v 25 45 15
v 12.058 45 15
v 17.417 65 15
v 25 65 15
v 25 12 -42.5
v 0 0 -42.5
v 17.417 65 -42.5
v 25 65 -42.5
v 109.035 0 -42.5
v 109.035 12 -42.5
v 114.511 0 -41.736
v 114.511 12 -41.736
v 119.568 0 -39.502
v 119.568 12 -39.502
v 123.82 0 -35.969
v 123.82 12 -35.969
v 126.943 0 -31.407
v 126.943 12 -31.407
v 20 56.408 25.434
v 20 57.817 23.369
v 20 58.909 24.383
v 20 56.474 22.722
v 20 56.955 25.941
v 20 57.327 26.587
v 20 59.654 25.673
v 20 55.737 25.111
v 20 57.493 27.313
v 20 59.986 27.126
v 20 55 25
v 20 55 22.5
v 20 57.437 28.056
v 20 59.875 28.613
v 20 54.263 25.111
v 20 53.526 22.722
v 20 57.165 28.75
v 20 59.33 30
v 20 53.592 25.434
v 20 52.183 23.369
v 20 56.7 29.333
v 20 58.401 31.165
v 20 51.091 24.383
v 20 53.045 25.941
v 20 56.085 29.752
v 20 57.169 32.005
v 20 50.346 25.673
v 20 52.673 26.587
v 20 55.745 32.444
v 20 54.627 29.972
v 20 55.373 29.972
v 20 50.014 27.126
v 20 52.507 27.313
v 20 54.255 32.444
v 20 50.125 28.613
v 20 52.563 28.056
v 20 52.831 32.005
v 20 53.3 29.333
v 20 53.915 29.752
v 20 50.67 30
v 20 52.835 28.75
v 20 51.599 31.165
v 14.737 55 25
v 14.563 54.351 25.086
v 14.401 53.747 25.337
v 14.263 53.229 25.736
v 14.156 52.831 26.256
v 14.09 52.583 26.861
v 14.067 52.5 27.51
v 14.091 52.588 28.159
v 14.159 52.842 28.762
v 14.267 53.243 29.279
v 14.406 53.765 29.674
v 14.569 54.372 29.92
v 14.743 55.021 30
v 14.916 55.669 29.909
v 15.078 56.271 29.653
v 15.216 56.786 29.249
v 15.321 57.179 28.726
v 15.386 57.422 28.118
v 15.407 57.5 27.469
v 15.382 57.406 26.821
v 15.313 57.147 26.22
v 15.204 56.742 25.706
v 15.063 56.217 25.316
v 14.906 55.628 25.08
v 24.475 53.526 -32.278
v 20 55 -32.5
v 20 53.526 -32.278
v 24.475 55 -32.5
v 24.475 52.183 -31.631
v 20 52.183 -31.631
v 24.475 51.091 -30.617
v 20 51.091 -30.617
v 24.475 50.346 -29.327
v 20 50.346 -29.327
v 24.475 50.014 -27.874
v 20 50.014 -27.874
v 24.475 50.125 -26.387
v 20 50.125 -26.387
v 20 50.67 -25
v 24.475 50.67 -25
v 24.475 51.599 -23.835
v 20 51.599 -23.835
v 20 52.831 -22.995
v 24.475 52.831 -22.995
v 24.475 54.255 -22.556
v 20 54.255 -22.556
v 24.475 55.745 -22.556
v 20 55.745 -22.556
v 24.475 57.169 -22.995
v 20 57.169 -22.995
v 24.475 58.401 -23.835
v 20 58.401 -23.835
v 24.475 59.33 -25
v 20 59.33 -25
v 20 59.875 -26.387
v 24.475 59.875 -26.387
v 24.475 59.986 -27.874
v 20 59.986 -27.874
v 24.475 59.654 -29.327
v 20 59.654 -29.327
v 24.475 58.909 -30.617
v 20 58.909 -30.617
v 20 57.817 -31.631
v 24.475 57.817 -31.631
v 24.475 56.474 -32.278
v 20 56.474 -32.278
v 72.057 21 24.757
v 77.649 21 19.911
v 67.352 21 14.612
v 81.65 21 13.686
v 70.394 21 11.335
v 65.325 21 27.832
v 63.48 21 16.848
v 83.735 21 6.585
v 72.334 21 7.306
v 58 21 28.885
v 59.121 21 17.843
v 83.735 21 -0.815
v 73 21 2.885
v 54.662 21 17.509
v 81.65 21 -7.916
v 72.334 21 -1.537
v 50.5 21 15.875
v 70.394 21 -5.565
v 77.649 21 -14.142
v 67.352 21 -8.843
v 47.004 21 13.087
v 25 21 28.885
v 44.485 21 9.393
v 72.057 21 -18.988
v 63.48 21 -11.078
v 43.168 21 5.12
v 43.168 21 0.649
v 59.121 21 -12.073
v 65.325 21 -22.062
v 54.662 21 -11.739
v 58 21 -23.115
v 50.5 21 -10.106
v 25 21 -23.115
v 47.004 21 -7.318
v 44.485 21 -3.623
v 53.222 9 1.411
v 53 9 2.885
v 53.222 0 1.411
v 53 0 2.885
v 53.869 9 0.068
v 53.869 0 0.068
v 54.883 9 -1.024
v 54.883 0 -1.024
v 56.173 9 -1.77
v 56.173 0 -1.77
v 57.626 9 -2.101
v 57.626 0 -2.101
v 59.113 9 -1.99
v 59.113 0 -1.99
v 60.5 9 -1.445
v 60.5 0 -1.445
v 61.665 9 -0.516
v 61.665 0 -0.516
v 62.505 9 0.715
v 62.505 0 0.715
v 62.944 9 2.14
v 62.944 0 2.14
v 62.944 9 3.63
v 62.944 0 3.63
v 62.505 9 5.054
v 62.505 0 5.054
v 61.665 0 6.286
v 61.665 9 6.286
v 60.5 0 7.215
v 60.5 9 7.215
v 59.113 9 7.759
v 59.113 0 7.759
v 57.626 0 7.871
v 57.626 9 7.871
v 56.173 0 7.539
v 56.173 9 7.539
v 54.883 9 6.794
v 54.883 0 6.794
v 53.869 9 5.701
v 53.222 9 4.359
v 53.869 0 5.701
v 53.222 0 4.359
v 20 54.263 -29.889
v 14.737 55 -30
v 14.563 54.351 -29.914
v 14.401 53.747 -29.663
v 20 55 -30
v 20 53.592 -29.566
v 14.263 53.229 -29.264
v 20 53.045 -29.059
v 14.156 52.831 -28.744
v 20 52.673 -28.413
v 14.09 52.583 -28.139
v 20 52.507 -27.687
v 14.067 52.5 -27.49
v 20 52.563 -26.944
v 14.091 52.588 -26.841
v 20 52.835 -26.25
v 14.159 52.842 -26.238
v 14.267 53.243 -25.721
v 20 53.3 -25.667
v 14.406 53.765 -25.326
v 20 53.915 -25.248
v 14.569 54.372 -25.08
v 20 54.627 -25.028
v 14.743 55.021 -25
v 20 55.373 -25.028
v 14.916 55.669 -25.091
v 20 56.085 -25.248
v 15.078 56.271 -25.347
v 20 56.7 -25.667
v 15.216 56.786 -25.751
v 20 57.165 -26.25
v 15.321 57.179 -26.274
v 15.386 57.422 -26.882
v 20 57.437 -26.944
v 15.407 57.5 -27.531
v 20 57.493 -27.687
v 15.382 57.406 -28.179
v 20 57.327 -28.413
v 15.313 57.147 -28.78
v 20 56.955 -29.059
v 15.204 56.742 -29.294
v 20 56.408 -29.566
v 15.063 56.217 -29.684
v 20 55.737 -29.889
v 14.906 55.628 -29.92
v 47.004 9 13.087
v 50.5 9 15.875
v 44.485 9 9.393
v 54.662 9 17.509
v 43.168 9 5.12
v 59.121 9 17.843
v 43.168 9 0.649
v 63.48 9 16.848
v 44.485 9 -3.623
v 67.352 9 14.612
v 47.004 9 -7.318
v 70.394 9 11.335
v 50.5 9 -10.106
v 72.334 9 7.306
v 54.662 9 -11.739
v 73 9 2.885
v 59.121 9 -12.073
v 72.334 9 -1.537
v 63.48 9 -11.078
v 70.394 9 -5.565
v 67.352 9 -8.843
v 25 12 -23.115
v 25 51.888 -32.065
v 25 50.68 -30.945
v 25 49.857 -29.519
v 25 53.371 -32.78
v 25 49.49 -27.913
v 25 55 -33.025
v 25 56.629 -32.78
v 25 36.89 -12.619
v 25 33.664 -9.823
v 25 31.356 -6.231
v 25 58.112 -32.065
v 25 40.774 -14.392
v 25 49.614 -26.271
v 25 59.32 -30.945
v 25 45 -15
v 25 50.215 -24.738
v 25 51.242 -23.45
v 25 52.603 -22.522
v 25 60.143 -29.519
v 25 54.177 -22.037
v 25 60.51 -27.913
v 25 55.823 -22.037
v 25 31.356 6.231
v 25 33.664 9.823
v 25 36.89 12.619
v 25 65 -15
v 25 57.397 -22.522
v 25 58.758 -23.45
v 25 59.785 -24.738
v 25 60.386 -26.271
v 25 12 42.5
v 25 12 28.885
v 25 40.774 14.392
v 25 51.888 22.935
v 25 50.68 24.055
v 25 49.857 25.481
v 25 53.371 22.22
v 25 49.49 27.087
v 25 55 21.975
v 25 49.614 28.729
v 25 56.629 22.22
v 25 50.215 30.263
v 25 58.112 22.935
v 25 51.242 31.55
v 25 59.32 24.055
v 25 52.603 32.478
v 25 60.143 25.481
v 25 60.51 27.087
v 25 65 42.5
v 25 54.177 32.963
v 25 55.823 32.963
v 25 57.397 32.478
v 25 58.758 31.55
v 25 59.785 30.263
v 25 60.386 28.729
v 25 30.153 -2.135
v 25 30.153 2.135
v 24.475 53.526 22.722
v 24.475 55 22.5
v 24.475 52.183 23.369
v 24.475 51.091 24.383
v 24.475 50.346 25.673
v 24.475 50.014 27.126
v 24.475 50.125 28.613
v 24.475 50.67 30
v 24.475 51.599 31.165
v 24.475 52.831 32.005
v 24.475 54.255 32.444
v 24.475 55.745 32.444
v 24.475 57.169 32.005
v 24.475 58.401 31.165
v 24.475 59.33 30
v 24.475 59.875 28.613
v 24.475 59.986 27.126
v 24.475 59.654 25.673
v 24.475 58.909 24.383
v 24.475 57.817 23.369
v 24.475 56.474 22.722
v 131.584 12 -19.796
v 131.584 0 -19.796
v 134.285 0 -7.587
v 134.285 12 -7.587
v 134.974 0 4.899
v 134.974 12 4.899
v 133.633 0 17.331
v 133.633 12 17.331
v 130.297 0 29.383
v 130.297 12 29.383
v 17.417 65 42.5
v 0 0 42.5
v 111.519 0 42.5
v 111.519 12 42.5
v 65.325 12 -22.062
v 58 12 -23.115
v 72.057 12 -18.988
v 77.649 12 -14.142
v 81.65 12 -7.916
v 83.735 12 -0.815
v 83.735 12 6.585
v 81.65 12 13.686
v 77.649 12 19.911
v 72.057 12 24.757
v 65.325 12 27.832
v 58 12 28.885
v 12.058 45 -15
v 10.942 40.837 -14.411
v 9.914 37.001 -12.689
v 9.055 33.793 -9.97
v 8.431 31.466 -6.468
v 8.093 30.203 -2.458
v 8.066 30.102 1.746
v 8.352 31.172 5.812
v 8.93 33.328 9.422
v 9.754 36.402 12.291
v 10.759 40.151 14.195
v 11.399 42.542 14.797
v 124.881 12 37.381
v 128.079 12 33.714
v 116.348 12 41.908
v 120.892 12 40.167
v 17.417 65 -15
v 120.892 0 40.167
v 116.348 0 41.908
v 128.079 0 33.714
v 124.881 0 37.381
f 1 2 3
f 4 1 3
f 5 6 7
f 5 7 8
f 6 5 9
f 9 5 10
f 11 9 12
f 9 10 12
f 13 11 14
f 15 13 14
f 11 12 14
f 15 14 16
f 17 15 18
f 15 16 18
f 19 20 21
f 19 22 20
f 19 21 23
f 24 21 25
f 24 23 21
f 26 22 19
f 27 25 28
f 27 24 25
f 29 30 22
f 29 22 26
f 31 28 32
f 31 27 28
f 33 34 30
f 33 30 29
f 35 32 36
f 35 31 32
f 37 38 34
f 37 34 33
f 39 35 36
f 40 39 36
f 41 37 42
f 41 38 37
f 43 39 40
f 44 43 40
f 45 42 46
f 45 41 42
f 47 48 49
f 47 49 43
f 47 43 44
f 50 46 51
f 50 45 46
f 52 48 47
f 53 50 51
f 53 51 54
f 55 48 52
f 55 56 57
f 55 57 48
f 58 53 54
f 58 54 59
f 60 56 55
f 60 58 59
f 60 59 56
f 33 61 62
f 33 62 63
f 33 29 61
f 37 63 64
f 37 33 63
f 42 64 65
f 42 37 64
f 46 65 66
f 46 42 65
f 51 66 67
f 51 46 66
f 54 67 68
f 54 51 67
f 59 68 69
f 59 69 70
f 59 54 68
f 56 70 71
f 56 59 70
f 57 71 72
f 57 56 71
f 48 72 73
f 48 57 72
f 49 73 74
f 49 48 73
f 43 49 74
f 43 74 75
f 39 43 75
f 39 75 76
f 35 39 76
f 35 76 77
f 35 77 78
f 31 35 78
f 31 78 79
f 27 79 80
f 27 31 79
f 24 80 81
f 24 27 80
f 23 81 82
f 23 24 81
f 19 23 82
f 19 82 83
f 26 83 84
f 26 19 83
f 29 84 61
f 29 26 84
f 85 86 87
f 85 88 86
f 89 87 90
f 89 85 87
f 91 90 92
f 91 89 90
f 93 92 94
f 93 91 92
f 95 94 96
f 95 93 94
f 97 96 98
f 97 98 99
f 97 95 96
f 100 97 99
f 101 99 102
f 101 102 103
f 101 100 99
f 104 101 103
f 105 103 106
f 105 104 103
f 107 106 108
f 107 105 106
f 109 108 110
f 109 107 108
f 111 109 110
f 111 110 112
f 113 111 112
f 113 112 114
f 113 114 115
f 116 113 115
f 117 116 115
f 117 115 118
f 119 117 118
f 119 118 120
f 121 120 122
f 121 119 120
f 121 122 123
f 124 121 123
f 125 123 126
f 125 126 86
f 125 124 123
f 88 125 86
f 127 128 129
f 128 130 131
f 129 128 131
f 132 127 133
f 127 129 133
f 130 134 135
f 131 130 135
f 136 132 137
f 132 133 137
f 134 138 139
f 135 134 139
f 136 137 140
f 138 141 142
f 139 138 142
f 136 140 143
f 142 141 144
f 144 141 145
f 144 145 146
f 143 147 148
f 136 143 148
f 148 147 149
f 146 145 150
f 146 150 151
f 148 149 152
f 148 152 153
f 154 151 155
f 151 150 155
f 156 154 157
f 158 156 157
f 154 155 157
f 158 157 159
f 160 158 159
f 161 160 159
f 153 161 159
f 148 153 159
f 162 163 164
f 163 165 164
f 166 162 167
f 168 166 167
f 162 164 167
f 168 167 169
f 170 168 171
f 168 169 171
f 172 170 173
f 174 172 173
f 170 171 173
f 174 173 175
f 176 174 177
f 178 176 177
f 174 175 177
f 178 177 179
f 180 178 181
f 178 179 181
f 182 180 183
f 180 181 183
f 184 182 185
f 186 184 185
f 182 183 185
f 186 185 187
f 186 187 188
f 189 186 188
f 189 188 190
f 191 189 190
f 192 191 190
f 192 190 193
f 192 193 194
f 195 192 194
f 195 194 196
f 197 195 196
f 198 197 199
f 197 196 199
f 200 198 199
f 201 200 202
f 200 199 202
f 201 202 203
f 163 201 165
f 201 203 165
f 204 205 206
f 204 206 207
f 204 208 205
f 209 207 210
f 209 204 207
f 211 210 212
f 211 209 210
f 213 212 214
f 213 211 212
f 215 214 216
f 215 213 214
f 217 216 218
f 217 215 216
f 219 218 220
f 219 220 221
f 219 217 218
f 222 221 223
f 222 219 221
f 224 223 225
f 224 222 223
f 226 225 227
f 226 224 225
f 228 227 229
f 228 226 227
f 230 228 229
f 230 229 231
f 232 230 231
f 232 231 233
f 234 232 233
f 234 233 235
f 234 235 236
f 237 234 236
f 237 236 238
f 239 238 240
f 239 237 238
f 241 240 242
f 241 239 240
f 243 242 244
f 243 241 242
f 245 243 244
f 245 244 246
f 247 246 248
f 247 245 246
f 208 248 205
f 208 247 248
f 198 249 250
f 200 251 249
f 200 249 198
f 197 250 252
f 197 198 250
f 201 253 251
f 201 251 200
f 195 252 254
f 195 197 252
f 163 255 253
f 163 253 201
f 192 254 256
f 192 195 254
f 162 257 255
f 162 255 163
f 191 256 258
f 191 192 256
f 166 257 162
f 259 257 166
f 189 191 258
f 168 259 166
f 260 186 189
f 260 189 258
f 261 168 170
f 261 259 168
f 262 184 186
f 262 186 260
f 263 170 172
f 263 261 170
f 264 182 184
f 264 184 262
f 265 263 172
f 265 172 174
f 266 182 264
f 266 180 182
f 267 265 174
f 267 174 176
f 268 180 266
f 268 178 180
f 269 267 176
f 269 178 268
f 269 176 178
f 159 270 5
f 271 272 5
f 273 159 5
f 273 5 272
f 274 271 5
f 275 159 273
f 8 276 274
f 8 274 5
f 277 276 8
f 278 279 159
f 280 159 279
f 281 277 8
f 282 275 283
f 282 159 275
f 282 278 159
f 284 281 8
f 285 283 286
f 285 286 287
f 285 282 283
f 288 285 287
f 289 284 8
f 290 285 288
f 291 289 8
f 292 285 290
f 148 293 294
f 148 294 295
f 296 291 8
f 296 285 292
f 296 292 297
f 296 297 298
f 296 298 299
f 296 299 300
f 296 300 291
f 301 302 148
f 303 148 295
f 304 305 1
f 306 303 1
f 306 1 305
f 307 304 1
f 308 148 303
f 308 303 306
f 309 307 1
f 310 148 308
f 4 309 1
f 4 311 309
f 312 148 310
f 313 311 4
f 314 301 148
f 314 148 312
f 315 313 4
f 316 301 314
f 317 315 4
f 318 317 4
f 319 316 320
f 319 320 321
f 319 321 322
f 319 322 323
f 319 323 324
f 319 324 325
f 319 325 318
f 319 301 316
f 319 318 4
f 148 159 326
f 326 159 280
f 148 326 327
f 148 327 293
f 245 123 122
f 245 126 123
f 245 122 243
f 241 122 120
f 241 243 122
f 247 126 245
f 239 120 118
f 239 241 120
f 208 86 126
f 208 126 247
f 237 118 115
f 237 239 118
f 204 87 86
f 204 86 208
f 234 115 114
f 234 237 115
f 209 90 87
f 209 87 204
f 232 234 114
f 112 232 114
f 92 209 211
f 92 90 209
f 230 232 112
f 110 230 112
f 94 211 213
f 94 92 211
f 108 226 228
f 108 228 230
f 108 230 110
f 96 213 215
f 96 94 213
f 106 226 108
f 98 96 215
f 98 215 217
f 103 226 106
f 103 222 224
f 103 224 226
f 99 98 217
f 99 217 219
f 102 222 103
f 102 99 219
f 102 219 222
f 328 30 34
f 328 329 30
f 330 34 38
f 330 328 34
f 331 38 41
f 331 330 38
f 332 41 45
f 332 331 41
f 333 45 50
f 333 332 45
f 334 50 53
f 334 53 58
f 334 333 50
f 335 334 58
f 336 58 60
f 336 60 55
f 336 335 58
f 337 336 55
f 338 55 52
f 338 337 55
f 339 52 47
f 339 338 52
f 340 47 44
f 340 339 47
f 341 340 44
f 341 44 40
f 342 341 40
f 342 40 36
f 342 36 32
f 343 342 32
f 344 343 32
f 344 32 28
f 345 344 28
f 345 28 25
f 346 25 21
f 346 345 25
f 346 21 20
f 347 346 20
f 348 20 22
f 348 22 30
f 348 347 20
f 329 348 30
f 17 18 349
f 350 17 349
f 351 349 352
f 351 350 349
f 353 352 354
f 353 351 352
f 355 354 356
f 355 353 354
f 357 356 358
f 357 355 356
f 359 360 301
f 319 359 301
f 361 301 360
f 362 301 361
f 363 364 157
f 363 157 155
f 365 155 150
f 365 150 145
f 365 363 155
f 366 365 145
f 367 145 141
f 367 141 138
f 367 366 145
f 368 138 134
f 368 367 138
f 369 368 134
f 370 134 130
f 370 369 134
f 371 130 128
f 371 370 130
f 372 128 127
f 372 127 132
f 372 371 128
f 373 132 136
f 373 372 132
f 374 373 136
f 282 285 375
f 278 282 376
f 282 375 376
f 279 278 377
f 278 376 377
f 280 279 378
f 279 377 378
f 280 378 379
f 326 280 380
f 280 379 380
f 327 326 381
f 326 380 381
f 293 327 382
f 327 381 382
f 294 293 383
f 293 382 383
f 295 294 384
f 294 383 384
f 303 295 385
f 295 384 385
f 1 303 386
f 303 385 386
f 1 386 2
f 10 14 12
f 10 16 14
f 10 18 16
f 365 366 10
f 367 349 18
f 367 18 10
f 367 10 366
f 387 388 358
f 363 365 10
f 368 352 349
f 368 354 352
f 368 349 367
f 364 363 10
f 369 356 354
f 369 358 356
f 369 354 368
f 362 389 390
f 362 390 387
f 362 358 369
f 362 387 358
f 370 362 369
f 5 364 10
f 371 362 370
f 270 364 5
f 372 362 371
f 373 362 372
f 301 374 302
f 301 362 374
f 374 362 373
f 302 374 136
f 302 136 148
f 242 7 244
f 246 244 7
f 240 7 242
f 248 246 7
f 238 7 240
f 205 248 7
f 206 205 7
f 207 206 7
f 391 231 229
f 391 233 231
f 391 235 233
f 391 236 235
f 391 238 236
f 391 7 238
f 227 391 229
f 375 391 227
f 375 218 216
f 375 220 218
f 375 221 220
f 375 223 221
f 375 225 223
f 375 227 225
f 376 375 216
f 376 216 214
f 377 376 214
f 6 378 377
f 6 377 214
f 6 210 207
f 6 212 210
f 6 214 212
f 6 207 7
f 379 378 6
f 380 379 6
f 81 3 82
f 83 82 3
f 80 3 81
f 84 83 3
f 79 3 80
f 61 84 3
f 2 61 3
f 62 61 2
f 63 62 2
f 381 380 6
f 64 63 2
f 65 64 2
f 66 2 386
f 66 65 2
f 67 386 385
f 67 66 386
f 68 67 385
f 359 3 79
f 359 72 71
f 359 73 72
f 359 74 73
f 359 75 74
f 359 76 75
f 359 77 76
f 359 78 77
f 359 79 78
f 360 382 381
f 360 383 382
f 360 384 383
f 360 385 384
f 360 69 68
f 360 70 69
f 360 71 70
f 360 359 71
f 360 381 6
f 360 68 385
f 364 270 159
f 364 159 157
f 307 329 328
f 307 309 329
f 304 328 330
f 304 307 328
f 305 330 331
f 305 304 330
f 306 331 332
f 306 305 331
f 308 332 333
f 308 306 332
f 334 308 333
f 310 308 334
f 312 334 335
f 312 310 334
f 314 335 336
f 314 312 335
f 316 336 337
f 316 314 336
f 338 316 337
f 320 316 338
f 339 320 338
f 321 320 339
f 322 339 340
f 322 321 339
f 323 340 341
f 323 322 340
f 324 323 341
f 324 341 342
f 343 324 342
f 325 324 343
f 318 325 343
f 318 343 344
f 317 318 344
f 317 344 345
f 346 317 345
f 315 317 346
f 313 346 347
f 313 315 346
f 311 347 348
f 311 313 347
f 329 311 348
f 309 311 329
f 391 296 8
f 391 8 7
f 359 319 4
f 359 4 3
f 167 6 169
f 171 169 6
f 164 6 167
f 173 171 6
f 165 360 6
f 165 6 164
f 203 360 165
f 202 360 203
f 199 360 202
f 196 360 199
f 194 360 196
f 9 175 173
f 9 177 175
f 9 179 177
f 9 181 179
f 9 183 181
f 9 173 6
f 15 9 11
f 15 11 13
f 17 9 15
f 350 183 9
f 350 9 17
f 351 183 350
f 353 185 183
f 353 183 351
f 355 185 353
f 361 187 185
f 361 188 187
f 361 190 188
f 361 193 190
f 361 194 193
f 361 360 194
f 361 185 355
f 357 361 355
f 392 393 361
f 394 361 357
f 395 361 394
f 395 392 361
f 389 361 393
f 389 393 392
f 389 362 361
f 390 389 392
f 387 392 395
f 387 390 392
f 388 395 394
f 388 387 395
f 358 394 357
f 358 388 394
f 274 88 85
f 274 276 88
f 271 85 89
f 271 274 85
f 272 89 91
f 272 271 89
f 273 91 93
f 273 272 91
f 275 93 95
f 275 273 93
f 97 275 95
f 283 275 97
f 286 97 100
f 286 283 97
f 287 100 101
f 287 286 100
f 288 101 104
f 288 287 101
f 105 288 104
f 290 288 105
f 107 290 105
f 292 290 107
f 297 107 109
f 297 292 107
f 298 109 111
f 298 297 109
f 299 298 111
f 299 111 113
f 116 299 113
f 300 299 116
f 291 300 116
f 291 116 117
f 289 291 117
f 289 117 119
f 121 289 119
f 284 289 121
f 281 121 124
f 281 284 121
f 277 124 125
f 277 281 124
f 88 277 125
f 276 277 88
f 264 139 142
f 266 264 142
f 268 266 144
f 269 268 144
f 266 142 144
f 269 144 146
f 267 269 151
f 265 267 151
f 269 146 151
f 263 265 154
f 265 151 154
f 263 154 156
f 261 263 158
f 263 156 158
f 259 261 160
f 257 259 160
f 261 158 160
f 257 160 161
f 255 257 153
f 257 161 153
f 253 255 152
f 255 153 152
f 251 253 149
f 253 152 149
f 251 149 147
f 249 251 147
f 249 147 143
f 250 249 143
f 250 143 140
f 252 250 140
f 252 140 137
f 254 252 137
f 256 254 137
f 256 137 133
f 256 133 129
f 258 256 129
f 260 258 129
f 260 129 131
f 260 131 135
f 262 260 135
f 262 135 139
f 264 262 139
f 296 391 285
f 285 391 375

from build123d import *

# Parameters (mm, degrees)
P_IDAT_VYSUNUT_M1_DEPTH                           = 42.5
ODEBRAT_VYSUNUT_M1_DEPTH                          = 152.129911004
ODEBRAT_VYSUNUT_M1_DEPTH_BACK                     = 152.129911004
P_IDAT_VYSUNUT_M2_DEPTH                           = 9
ODEBRAT_VYSUNUT_M2_DEPTH                          = 135.652330095
ODEBRAT_VYSUNUT_M2_DEPTH_BACK                     = 135.652330095
V_LCOV_ZAHLOUBEN_PRO_M5_ROUBY_S_V_2_COUNT         = 2
V_LCOV_ZAHLOUBEN_PRO_M5_ROUBY_S_V_2_PITCH         = 27.950849719
V_LCOV_ZAHLOUBEN_PRO_M5_ROUBY_S_V_3_COUNT         = 2
V_LCOV_ZAHLOUBEN_PRO_M5_ROUBY_S_V_3_PITCH         = 27.950849719
V_LCOV_ZAHLOUBEN_PRO_M10_ROUBY_S_V_LC_D           = 10
V_LCOV_ZAHLOUBEN_PRO_M10_ROUBY_S_V_LC_CBORE_D     = 30
V_LCOV_ZAHLOUBEN_PRO_M10_ROUBY_S_V_LC_CBORE_DEPTH = 12
ZAOBLIT1_R                                        = 20


with BuildPart() as part:
    # Skica1 → Přidat vysunutím1 (new, symmetric)
    with BuildSketch(Plane.XY):
        Polygon((0, 0), (135, 0), (135, 12), (25, 12), (25, 65), (17.416697508, 65), align=None)
    extrude(amount=P_IDAT_VYSUNUT_M1_DEPTH, both=True)

    # Skica2 → Odebrat vysunutím1 (cut, two sides: drawn at the far end of the back side and taken through both)
    with BuildSketch(Plane(origin=(0, 12, 0), x_dir=(1, 0, 0), z_dir=(0, 1, 0)).offset(-ODEBRAT_VYSUNUT_M1_DEPTH_BACK)):
        with BuildLine():
            Line((-62.938175678, 293.50791206), (120.203054159, 42.5))
            ThreePointArc((120.203054159, 42.5), (134.922176639, 0.576231991), (124.027539054, -42.5))
            Line((124.027539054, -42.5), (-35.831632193, -308.940851505))
            Line((-35.831632193, -308.940851505), (584.976307558, -281.00825635))
            Line((584.976307558, -281.00825635), (557.869764074, 321.440507215))
            Line((557.869764074, 321.440507215), (-62.938175678, 293.50791206))
        make_face()
    extrude(amount=ODEBRAT_VYSUNUT_M1_DEPTH + ODEBRAT_VYSUNUT_M1_DEPTH_BACK, mode=Mode.SUBTRACT)

    # Skica3 → Přidat vysunutím2 (add)
    with BuildSketch(Plane(origin=(0, 12, 0), x_dir=(1, 0, 0), z_dir=(0, 1, 0))):
        with BuildLine():
            Line((25, 23.115200195), (58, 23.115200195))
            ThreePointArc((58, 23.115200195), (84, -2.884799805), (58, -28.884799805))
            Line((58, -28.884799805), (25, -28.884799805))
            Line((25, -28.884799805), (25, 23.115200195))
        make_face()
    extrude(amount=P_IDAT_VYSUNUT_M2_DEPTH)

    # Skica4 → Odebrat vysunutím2 (cut, two sides: drawn at the far end of the back side and taken through both)
    with BuildSketch(Plane(origin=(25, 0, 0), x_dir=(0, 0, -1), z_dir=(1, 0, 0)).offset(-ODEBRAT_VYSUNUT_M2_DEPTH_BACK)):
        with BuildLine():
            Line((15, 65), (15, 45))
            ThreePointArc((15, 45), (0, 30), (-15, 45))
            Line((-15, 45), (-15, 65))
            Line((-15, 65), (15, 65))
        make_face()
    extrude(amount=ODEBRAT_VYSUNUT_M2_DEPTH + ODEBRAT_VYSUNUT_M2_DEPTH_BACK, mode=Mode.SUBTRACT)

    # Skica9 → Válcové zahloubení pro M5 šrouby s válcovou hlavou zaoblenou1 (revolve, cut)
    with BuildSketch(Plane(origin=(25, 60, 0), x_dir=(0, 0, -1), z_dir=(0, 1, 0))):
        Polygon((0, 0), (0, 25), (2.5, 25), (2.5, 5), (5, 5), (5, 0.525), (5.525, 0), align=None)
    v_lcov_zahlouben_pro_m5_rouby_s_v_lco = revolve(axis=Axis((31.35, 60, 0), (-1, 0, 0)), mode=Mode.SUBTRACT)

    # V_lcov_ zahlouben_ pro M5 _rouby s v 2: Válcové zahloubení pro M5 šrouby s válcovou hlavou zaoblenou1 ×2
    with Locations(*[Vector(0, -0.1788854381999832, -0.9838699100999074) * (i * V_LCOV_ZAHLOUBEN_PRO_M5_ROUBY_S_V_2_PITCH) for i in range(1, V_LCOV_ZAHLOUBEN_PRO_M5_ROUBY_S_V_2_COUNT)]):
        add(v_lcov_zahlouben_pro_m5_rouby_s_v_lco, mode=Mode.SUBTRACT)

    # V_lcov_ zahlouben_ pro M5 _rouby s v 3: Válcové zahloubení pro M5 šrouby s válcovou hlavou zaoblenou1 ×2
    with Locations(*[Vector(0, -0.1788854381999834, 0.9838699100999074) * (i * V_LCOV_ZAHLOUBEN_PRO_M5_ROUBY_S_V_3_PITCH) for i in range(1, V_LCOV_ZAHLOUBEN_PRO_M5_ROUBY_S_V_3_COUNT)]):
        add(v_lcov_zahlouben_pro_m5_rouby_s_v_lco, mode=Mode.SUBTRACT)

    # Válcové zahloubení pro M10 šrouby s válcovou hlavou zaoblenou3 (through all)
    with Locations(Plane(origin=(0, 21, 0), x_dir=(1, 0, 0), z_dir=(0, 1, 0))):
        with Locations((58, -2.884799805)):
            CounterBoreHole(V_LCOV_ZAHLOUBEN_PRO_M10_ROUBY_S_V_LC_D / 2, V_LCOV_ZAHLOUBEN_PRO_M10_ROUBY_S_V_LC_CBORE_D / 2, V_LCOV_ZAHLOUBEN_PRO_M10_ROUBY_S_V_LC_CBORE_DEPTH)

    # Zaoblit1
    zaoblit1_edges = [part.edges().sort_by_distance(p)[0] for p in [
        (120.203054159, 6, -42.5),
        (124.027539054, 6, 42.5),
    ]]
    fillet(zaoblit1_edges, radius=ZAOBLIT1_R)


solid = part.part
